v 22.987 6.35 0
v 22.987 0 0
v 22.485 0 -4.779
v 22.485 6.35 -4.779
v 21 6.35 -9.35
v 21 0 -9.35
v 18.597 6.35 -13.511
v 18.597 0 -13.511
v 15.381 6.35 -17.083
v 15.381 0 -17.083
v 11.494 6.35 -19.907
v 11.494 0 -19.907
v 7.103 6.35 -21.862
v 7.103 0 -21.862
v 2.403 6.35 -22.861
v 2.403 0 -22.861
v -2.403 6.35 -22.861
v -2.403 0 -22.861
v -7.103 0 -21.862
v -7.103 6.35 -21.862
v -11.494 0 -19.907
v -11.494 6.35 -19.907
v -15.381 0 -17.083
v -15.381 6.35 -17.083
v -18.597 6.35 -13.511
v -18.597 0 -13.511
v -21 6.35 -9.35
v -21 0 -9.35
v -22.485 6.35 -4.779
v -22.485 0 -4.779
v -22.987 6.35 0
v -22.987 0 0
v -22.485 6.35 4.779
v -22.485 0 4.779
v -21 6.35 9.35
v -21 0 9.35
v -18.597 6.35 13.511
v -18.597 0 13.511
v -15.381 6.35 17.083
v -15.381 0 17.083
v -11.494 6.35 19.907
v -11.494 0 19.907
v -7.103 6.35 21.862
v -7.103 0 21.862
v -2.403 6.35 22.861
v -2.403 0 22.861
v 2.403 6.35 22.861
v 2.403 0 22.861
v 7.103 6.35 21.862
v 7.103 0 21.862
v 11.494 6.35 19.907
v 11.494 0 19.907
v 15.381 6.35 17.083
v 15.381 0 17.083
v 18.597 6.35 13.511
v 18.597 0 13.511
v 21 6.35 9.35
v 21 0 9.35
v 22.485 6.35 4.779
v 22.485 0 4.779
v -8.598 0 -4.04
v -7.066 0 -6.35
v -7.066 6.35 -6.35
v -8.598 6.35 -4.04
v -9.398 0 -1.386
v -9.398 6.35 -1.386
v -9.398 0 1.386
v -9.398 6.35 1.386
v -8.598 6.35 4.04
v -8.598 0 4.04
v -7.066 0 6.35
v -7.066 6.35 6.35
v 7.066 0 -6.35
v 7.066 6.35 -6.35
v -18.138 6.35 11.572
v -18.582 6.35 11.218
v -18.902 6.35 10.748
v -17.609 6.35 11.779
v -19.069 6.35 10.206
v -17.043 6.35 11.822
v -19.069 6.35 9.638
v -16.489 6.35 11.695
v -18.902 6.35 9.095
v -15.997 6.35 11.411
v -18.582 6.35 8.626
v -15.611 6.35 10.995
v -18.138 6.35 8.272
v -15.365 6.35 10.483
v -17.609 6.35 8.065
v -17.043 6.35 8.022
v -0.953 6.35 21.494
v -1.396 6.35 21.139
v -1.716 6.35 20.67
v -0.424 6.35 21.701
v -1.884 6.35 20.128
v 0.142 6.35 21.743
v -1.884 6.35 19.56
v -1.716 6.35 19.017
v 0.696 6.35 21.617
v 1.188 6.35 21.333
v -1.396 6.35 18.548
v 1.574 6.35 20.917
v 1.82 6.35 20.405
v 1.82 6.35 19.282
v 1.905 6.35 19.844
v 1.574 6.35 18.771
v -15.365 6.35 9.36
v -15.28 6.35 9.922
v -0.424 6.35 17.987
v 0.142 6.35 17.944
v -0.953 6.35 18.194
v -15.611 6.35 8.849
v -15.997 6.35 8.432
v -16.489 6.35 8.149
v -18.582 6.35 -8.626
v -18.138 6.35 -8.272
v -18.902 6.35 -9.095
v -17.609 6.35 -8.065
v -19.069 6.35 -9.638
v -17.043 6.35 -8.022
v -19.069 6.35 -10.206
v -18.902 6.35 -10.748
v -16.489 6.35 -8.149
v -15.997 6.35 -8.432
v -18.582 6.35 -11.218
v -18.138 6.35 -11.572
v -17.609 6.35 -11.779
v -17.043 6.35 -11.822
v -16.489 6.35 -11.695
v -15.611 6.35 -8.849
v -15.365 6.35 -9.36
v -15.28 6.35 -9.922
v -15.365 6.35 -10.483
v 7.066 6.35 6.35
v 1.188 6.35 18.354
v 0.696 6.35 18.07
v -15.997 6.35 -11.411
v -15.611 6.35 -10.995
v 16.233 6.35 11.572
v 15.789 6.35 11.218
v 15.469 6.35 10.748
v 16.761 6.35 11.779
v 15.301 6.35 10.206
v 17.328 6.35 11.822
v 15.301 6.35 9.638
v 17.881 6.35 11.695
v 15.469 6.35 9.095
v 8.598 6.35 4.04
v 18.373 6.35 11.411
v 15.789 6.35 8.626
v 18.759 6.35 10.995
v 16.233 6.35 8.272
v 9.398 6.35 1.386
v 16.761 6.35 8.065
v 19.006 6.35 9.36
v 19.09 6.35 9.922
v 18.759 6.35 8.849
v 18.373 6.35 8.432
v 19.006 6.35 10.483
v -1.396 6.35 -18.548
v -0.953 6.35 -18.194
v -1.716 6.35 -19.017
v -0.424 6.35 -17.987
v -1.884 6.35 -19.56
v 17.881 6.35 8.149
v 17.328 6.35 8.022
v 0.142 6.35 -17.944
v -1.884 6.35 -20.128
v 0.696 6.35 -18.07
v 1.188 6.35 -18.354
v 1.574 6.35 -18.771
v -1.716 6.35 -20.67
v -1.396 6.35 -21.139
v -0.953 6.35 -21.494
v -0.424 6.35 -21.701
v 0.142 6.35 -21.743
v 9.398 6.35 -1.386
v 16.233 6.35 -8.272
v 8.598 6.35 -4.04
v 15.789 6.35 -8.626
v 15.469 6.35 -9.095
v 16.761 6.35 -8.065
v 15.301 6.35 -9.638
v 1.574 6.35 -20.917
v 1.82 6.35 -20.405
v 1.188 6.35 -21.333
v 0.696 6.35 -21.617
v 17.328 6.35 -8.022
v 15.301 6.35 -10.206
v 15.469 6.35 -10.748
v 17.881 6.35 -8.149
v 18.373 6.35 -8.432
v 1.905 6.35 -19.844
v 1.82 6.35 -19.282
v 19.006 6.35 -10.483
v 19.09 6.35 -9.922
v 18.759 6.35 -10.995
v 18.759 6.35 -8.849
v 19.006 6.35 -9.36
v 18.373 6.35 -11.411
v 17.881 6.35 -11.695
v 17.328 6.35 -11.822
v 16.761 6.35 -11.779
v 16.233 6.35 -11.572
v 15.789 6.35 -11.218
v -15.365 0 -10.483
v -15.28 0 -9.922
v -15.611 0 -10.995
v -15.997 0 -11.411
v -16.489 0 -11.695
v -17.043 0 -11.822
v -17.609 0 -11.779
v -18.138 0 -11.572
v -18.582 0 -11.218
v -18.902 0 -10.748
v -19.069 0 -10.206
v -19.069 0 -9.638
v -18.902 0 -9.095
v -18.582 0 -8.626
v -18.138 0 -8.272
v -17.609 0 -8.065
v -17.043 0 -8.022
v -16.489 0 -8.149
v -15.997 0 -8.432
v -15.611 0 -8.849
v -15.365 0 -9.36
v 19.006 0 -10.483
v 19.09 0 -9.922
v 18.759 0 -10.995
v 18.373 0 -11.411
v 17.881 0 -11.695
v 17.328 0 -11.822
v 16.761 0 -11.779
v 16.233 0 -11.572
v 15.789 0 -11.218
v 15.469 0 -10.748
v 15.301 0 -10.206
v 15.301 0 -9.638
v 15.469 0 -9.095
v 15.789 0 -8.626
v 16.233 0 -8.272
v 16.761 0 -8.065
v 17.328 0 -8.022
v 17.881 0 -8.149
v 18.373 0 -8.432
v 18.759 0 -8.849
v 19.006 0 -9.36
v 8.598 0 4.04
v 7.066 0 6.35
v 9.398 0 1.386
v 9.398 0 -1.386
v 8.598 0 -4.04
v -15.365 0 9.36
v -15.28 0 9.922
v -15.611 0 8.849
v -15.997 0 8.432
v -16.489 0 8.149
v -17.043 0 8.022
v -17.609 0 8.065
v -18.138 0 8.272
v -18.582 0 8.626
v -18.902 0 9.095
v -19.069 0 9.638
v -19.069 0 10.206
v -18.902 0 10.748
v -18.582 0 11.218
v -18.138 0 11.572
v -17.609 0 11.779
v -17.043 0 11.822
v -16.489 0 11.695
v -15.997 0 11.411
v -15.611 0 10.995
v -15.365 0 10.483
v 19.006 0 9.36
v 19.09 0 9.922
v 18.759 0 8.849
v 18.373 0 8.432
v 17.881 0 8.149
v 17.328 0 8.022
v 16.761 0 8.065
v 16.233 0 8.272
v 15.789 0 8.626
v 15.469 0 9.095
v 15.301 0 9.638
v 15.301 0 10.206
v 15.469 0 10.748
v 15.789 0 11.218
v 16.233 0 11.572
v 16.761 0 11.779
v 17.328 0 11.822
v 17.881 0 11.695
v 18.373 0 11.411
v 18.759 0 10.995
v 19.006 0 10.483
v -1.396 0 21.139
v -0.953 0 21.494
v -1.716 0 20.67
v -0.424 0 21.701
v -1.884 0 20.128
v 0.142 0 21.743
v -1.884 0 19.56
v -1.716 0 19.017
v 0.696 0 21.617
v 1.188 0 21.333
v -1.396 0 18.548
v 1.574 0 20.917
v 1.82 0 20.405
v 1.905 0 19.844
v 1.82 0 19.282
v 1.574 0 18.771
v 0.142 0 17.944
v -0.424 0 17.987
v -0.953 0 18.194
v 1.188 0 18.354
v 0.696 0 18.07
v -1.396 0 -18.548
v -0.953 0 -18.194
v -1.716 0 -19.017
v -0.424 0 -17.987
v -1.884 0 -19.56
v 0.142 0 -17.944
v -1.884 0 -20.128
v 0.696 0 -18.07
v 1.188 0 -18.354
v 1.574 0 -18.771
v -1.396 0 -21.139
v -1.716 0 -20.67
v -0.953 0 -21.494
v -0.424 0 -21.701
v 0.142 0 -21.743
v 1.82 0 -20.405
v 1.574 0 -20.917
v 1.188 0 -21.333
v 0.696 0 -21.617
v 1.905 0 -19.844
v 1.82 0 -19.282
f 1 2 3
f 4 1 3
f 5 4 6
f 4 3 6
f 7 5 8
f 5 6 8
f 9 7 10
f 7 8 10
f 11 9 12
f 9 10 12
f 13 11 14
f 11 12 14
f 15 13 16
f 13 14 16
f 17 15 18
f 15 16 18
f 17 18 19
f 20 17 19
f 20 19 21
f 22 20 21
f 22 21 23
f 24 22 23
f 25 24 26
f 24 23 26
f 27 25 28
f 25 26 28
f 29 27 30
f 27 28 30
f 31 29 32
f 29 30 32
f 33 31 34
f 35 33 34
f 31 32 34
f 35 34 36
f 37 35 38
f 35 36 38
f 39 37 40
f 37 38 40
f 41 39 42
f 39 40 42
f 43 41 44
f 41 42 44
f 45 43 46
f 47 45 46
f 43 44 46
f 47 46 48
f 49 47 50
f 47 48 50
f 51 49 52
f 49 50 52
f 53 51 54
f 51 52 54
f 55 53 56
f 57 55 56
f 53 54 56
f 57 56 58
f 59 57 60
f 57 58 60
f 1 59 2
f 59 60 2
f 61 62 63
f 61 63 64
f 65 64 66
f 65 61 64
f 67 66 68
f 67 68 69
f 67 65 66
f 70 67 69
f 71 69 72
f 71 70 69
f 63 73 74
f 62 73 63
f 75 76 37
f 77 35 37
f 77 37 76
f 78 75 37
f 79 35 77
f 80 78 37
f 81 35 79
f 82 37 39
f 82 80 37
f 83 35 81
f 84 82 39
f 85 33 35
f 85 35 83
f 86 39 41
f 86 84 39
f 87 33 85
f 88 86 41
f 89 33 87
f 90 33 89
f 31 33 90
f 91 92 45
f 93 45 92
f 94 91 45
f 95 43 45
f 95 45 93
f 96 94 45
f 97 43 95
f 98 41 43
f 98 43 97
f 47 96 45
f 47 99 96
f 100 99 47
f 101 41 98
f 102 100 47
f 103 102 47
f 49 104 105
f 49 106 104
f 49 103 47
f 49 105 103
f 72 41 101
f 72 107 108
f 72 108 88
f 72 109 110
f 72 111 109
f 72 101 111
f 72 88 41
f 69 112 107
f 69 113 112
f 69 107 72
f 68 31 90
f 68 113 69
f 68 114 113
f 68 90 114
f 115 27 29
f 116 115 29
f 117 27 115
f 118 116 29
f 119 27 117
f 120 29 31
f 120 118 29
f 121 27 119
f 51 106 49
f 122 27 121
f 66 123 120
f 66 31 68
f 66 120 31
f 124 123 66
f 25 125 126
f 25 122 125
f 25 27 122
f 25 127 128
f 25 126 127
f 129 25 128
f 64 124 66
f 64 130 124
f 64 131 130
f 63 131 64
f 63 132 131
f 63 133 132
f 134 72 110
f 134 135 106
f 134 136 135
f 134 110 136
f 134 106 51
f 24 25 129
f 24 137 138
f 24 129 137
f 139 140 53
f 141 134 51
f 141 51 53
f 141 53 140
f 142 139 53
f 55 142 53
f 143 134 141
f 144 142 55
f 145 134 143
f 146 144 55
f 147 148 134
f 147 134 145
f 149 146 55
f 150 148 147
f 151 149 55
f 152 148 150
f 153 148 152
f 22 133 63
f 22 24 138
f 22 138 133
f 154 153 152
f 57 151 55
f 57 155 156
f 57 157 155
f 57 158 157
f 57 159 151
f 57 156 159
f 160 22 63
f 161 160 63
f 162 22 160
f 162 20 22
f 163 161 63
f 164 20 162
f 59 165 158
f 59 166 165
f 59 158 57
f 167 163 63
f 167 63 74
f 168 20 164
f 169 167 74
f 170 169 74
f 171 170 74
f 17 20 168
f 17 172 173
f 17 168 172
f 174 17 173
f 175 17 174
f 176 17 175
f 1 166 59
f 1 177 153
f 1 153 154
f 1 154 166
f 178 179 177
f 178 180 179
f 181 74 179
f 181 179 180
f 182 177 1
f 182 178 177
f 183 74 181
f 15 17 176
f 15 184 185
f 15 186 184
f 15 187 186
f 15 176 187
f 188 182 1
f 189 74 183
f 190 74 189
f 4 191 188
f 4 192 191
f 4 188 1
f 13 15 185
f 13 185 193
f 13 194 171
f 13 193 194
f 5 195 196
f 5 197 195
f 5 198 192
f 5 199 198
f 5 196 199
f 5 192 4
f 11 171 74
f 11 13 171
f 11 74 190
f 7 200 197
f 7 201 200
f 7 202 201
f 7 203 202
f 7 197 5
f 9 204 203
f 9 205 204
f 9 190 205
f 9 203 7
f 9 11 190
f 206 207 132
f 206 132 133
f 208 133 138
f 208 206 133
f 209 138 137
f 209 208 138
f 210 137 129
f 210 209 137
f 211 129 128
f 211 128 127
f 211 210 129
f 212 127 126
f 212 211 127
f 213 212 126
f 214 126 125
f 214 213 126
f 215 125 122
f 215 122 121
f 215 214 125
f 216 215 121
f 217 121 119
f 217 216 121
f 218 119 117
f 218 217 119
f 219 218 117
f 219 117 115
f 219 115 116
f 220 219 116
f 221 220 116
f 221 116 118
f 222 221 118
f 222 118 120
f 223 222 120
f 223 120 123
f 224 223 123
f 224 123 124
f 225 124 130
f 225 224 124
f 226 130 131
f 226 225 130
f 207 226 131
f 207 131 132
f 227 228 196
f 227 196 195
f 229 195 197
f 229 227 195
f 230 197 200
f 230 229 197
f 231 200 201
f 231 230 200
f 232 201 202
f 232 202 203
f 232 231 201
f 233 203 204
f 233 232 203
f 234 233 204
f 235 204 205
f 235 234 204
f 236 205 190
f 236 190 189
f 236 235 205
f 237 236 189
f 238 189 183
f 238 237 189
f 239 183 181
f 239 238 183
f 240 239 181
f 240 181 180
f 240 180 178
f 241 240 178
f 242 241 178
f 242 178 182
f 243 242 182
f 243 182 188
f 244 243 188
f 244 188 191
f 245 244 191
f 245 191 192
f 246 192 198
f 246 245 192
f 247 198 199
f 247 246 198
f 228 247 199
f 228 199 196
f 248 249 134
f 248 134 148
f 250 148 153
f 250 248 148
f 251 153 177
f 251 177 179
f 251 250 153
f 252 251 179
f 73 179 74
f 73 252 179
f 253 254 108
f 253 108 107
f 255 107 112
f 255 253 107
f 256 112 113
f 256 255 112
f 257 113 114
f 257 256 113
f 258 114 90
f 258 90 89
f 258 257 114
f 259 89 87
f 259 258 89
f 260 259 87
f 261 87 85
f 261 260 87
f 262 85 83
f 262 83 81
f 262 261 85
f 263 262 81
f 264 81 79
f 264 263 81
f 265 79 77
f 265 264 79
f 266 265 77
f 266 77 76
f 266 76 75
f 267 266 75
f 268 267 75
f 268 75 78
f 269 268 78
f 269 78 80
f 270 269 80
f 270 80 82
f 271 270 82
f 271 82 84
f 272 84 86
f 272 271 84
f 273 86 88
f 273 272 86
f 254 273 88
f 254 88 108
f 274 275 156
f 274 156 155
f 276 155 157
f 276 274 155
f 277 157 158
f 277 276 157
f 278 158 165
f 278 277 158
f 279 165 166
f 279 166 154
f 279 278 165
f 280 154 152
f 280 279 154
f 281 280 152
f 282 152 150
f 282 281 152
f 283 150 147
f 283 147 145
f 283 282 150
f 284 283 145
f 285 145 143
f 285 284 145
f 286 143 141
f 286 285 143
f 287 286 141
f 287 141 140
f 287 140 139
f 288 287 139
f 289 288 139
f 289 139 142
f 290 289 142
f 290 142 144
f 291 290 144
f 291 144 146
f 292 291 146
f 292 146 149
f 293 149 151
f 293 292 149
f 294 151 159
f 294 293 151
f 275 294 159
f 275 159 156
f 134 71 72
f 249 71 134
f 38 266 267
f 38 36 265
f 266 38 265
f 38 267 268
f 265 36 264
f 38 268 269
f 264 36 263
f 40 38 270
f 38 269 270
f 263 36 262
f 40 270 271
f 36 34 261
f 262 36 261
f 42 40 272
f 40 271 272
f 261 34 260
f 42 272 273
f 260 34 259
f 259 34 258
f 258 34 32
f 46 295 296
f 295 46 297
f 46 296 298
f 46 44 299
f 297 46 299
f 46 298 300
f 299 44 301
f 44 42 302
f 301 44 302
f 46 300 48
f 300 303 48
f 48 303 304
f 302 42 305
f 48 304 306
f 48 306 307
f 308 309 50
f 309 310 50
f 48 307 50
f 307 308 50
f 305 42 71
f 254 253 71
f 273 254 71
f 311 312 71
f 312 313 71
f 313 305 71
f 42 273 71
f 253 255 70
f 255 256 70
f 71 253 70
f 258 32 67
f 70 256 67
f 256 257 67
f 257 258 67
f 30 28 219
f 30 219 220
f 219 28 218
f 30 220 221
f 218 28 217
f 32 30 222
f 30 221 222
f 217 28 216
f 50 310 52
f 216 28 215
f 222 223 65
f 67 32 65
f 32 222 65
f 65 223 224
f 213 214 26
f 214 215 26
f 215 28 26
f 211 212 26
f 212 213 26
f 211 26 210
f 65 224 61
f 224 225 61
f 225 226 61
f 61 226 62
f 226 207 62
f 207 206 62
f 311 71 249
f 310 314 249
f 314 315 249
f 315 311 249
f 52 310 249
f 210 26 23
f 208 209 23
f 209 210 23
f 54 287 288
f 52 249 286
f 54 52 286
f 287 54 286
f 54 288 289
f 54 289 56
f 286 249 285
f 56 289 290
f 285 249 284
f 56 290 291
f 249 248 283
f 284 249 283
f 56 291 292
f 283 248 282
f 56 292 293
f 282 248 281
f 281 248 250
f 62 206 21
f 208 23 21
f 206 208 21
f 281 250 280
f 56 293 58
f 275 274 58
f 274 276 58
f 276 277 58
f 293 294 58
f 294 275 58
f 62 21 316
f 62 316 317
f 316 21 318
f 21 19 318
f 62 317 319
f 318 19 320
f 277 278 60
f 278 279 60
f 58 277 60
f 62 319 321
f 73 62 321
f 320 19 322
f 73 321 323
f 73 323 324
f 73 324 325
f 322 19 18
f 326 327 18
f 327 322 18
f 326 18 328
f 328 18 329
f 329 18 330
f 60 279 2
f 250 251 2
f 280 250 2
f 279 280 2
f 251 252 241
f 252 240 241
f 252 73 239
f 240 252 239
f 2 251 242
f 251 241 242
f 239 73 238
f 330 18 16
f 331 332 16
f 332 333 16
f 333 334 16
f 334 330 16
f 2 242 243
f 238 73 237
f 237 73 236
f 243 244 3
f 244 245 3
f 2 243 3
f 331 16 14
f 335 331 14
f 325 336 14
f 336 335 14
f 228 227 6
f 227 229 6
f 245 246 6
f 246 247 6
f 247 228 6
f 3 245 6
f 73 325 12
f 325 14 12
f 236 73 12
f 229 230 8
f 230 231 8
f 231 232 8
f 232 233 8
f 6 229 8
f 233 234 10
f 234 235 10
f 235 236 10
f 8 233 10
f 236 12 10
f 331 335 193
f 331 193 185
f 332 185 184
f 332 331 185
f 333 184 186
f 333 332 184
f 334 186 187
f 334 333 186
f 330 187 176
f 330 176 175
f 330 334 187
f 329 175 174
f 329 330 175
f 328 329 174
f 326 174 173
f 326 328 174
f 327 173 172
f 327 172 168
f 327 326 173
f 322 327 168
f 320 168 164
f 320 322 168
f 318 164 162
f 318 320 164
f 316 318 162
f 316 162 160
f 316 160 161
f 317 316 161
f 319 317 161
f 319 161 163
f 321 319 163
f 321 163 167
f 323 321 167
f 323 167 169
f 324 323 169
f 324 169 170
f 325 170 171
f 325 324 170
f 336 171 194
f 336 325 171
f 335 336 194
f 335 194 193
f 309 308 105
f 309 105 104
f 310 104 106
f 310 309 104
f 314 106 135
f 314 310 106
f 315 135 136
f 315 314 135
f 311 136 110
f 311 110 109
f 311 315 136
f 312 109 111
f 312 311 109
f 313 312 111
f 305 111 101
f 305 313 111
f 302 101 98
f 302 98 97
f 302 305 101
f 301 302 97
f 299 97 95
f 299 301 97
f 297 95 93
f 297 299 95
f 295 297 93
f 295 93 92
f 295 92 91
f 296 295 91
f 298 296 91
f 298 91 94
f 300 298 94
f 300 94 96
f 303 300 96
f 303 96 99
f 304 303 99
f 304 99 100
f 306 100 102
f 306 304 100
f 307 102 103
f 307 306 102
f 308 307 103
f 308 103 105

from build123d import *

# Parameters (mm, degrees)
SKETCH1_R           = 22.987
SKETCH1_R_2         = 1.905
BOSS_EXTRUDE1_DEPTH = 6.35


with BuildPart() as part:
    # Sketch1 → Boss-Extrude1 (new body)
    with BuildSketch(Plane(origin=(0, 0, 0), x_dir=(1, 0, 0), z_dir=(0, 1, 0))):
        Circle(SKETCH1_R)
        with Locations((0, 19.84375)):
            Circle(SKETCH1_R_2, mode=Mode.SUBTRACT)
        with Locations((17.185191606, 9.921875)):
            Circle(SKETCH1_R_2, mode=Mode.SUBTRACT)
        with Locations((17.185191606, -9.921875)):
            Circle(SKETCH1_R_2, mode=Mode.SUBTRACT)
        with Locations((0, -19.84375)):
            Circle(SKETCH1_R_2, mode=Mode.SUBTRACT)
        with Locations((-17.185191606, -9.921875)):
            Circle(SKETCH1_R_2, mode=Mode.SUBTRACT)
        with Locations((-17.185191606, 9.921875)):
            Circle(SKETCH1_R_2, mode=Mode.SUBTRACT)
        with BuildLine():
            Line((-7.065939428, -6.35), (7.065939428, -6.35))
            ThreePointArc((7.065939428, -6.35), (9.5, 0), (7.065939428, 6.35))
            Line((7.065939428, 6.35), (-7.065939428, 6.35))
            ThreePointArc((-7.065939428, 6.35), (-9.5, 0), (-7.065939428, -6.35))
        make_face(mode=Mode.SUBTRACT)
    extrude(amount=BOSS_EXTRUDE1_DEPTH)


solid = part.part
